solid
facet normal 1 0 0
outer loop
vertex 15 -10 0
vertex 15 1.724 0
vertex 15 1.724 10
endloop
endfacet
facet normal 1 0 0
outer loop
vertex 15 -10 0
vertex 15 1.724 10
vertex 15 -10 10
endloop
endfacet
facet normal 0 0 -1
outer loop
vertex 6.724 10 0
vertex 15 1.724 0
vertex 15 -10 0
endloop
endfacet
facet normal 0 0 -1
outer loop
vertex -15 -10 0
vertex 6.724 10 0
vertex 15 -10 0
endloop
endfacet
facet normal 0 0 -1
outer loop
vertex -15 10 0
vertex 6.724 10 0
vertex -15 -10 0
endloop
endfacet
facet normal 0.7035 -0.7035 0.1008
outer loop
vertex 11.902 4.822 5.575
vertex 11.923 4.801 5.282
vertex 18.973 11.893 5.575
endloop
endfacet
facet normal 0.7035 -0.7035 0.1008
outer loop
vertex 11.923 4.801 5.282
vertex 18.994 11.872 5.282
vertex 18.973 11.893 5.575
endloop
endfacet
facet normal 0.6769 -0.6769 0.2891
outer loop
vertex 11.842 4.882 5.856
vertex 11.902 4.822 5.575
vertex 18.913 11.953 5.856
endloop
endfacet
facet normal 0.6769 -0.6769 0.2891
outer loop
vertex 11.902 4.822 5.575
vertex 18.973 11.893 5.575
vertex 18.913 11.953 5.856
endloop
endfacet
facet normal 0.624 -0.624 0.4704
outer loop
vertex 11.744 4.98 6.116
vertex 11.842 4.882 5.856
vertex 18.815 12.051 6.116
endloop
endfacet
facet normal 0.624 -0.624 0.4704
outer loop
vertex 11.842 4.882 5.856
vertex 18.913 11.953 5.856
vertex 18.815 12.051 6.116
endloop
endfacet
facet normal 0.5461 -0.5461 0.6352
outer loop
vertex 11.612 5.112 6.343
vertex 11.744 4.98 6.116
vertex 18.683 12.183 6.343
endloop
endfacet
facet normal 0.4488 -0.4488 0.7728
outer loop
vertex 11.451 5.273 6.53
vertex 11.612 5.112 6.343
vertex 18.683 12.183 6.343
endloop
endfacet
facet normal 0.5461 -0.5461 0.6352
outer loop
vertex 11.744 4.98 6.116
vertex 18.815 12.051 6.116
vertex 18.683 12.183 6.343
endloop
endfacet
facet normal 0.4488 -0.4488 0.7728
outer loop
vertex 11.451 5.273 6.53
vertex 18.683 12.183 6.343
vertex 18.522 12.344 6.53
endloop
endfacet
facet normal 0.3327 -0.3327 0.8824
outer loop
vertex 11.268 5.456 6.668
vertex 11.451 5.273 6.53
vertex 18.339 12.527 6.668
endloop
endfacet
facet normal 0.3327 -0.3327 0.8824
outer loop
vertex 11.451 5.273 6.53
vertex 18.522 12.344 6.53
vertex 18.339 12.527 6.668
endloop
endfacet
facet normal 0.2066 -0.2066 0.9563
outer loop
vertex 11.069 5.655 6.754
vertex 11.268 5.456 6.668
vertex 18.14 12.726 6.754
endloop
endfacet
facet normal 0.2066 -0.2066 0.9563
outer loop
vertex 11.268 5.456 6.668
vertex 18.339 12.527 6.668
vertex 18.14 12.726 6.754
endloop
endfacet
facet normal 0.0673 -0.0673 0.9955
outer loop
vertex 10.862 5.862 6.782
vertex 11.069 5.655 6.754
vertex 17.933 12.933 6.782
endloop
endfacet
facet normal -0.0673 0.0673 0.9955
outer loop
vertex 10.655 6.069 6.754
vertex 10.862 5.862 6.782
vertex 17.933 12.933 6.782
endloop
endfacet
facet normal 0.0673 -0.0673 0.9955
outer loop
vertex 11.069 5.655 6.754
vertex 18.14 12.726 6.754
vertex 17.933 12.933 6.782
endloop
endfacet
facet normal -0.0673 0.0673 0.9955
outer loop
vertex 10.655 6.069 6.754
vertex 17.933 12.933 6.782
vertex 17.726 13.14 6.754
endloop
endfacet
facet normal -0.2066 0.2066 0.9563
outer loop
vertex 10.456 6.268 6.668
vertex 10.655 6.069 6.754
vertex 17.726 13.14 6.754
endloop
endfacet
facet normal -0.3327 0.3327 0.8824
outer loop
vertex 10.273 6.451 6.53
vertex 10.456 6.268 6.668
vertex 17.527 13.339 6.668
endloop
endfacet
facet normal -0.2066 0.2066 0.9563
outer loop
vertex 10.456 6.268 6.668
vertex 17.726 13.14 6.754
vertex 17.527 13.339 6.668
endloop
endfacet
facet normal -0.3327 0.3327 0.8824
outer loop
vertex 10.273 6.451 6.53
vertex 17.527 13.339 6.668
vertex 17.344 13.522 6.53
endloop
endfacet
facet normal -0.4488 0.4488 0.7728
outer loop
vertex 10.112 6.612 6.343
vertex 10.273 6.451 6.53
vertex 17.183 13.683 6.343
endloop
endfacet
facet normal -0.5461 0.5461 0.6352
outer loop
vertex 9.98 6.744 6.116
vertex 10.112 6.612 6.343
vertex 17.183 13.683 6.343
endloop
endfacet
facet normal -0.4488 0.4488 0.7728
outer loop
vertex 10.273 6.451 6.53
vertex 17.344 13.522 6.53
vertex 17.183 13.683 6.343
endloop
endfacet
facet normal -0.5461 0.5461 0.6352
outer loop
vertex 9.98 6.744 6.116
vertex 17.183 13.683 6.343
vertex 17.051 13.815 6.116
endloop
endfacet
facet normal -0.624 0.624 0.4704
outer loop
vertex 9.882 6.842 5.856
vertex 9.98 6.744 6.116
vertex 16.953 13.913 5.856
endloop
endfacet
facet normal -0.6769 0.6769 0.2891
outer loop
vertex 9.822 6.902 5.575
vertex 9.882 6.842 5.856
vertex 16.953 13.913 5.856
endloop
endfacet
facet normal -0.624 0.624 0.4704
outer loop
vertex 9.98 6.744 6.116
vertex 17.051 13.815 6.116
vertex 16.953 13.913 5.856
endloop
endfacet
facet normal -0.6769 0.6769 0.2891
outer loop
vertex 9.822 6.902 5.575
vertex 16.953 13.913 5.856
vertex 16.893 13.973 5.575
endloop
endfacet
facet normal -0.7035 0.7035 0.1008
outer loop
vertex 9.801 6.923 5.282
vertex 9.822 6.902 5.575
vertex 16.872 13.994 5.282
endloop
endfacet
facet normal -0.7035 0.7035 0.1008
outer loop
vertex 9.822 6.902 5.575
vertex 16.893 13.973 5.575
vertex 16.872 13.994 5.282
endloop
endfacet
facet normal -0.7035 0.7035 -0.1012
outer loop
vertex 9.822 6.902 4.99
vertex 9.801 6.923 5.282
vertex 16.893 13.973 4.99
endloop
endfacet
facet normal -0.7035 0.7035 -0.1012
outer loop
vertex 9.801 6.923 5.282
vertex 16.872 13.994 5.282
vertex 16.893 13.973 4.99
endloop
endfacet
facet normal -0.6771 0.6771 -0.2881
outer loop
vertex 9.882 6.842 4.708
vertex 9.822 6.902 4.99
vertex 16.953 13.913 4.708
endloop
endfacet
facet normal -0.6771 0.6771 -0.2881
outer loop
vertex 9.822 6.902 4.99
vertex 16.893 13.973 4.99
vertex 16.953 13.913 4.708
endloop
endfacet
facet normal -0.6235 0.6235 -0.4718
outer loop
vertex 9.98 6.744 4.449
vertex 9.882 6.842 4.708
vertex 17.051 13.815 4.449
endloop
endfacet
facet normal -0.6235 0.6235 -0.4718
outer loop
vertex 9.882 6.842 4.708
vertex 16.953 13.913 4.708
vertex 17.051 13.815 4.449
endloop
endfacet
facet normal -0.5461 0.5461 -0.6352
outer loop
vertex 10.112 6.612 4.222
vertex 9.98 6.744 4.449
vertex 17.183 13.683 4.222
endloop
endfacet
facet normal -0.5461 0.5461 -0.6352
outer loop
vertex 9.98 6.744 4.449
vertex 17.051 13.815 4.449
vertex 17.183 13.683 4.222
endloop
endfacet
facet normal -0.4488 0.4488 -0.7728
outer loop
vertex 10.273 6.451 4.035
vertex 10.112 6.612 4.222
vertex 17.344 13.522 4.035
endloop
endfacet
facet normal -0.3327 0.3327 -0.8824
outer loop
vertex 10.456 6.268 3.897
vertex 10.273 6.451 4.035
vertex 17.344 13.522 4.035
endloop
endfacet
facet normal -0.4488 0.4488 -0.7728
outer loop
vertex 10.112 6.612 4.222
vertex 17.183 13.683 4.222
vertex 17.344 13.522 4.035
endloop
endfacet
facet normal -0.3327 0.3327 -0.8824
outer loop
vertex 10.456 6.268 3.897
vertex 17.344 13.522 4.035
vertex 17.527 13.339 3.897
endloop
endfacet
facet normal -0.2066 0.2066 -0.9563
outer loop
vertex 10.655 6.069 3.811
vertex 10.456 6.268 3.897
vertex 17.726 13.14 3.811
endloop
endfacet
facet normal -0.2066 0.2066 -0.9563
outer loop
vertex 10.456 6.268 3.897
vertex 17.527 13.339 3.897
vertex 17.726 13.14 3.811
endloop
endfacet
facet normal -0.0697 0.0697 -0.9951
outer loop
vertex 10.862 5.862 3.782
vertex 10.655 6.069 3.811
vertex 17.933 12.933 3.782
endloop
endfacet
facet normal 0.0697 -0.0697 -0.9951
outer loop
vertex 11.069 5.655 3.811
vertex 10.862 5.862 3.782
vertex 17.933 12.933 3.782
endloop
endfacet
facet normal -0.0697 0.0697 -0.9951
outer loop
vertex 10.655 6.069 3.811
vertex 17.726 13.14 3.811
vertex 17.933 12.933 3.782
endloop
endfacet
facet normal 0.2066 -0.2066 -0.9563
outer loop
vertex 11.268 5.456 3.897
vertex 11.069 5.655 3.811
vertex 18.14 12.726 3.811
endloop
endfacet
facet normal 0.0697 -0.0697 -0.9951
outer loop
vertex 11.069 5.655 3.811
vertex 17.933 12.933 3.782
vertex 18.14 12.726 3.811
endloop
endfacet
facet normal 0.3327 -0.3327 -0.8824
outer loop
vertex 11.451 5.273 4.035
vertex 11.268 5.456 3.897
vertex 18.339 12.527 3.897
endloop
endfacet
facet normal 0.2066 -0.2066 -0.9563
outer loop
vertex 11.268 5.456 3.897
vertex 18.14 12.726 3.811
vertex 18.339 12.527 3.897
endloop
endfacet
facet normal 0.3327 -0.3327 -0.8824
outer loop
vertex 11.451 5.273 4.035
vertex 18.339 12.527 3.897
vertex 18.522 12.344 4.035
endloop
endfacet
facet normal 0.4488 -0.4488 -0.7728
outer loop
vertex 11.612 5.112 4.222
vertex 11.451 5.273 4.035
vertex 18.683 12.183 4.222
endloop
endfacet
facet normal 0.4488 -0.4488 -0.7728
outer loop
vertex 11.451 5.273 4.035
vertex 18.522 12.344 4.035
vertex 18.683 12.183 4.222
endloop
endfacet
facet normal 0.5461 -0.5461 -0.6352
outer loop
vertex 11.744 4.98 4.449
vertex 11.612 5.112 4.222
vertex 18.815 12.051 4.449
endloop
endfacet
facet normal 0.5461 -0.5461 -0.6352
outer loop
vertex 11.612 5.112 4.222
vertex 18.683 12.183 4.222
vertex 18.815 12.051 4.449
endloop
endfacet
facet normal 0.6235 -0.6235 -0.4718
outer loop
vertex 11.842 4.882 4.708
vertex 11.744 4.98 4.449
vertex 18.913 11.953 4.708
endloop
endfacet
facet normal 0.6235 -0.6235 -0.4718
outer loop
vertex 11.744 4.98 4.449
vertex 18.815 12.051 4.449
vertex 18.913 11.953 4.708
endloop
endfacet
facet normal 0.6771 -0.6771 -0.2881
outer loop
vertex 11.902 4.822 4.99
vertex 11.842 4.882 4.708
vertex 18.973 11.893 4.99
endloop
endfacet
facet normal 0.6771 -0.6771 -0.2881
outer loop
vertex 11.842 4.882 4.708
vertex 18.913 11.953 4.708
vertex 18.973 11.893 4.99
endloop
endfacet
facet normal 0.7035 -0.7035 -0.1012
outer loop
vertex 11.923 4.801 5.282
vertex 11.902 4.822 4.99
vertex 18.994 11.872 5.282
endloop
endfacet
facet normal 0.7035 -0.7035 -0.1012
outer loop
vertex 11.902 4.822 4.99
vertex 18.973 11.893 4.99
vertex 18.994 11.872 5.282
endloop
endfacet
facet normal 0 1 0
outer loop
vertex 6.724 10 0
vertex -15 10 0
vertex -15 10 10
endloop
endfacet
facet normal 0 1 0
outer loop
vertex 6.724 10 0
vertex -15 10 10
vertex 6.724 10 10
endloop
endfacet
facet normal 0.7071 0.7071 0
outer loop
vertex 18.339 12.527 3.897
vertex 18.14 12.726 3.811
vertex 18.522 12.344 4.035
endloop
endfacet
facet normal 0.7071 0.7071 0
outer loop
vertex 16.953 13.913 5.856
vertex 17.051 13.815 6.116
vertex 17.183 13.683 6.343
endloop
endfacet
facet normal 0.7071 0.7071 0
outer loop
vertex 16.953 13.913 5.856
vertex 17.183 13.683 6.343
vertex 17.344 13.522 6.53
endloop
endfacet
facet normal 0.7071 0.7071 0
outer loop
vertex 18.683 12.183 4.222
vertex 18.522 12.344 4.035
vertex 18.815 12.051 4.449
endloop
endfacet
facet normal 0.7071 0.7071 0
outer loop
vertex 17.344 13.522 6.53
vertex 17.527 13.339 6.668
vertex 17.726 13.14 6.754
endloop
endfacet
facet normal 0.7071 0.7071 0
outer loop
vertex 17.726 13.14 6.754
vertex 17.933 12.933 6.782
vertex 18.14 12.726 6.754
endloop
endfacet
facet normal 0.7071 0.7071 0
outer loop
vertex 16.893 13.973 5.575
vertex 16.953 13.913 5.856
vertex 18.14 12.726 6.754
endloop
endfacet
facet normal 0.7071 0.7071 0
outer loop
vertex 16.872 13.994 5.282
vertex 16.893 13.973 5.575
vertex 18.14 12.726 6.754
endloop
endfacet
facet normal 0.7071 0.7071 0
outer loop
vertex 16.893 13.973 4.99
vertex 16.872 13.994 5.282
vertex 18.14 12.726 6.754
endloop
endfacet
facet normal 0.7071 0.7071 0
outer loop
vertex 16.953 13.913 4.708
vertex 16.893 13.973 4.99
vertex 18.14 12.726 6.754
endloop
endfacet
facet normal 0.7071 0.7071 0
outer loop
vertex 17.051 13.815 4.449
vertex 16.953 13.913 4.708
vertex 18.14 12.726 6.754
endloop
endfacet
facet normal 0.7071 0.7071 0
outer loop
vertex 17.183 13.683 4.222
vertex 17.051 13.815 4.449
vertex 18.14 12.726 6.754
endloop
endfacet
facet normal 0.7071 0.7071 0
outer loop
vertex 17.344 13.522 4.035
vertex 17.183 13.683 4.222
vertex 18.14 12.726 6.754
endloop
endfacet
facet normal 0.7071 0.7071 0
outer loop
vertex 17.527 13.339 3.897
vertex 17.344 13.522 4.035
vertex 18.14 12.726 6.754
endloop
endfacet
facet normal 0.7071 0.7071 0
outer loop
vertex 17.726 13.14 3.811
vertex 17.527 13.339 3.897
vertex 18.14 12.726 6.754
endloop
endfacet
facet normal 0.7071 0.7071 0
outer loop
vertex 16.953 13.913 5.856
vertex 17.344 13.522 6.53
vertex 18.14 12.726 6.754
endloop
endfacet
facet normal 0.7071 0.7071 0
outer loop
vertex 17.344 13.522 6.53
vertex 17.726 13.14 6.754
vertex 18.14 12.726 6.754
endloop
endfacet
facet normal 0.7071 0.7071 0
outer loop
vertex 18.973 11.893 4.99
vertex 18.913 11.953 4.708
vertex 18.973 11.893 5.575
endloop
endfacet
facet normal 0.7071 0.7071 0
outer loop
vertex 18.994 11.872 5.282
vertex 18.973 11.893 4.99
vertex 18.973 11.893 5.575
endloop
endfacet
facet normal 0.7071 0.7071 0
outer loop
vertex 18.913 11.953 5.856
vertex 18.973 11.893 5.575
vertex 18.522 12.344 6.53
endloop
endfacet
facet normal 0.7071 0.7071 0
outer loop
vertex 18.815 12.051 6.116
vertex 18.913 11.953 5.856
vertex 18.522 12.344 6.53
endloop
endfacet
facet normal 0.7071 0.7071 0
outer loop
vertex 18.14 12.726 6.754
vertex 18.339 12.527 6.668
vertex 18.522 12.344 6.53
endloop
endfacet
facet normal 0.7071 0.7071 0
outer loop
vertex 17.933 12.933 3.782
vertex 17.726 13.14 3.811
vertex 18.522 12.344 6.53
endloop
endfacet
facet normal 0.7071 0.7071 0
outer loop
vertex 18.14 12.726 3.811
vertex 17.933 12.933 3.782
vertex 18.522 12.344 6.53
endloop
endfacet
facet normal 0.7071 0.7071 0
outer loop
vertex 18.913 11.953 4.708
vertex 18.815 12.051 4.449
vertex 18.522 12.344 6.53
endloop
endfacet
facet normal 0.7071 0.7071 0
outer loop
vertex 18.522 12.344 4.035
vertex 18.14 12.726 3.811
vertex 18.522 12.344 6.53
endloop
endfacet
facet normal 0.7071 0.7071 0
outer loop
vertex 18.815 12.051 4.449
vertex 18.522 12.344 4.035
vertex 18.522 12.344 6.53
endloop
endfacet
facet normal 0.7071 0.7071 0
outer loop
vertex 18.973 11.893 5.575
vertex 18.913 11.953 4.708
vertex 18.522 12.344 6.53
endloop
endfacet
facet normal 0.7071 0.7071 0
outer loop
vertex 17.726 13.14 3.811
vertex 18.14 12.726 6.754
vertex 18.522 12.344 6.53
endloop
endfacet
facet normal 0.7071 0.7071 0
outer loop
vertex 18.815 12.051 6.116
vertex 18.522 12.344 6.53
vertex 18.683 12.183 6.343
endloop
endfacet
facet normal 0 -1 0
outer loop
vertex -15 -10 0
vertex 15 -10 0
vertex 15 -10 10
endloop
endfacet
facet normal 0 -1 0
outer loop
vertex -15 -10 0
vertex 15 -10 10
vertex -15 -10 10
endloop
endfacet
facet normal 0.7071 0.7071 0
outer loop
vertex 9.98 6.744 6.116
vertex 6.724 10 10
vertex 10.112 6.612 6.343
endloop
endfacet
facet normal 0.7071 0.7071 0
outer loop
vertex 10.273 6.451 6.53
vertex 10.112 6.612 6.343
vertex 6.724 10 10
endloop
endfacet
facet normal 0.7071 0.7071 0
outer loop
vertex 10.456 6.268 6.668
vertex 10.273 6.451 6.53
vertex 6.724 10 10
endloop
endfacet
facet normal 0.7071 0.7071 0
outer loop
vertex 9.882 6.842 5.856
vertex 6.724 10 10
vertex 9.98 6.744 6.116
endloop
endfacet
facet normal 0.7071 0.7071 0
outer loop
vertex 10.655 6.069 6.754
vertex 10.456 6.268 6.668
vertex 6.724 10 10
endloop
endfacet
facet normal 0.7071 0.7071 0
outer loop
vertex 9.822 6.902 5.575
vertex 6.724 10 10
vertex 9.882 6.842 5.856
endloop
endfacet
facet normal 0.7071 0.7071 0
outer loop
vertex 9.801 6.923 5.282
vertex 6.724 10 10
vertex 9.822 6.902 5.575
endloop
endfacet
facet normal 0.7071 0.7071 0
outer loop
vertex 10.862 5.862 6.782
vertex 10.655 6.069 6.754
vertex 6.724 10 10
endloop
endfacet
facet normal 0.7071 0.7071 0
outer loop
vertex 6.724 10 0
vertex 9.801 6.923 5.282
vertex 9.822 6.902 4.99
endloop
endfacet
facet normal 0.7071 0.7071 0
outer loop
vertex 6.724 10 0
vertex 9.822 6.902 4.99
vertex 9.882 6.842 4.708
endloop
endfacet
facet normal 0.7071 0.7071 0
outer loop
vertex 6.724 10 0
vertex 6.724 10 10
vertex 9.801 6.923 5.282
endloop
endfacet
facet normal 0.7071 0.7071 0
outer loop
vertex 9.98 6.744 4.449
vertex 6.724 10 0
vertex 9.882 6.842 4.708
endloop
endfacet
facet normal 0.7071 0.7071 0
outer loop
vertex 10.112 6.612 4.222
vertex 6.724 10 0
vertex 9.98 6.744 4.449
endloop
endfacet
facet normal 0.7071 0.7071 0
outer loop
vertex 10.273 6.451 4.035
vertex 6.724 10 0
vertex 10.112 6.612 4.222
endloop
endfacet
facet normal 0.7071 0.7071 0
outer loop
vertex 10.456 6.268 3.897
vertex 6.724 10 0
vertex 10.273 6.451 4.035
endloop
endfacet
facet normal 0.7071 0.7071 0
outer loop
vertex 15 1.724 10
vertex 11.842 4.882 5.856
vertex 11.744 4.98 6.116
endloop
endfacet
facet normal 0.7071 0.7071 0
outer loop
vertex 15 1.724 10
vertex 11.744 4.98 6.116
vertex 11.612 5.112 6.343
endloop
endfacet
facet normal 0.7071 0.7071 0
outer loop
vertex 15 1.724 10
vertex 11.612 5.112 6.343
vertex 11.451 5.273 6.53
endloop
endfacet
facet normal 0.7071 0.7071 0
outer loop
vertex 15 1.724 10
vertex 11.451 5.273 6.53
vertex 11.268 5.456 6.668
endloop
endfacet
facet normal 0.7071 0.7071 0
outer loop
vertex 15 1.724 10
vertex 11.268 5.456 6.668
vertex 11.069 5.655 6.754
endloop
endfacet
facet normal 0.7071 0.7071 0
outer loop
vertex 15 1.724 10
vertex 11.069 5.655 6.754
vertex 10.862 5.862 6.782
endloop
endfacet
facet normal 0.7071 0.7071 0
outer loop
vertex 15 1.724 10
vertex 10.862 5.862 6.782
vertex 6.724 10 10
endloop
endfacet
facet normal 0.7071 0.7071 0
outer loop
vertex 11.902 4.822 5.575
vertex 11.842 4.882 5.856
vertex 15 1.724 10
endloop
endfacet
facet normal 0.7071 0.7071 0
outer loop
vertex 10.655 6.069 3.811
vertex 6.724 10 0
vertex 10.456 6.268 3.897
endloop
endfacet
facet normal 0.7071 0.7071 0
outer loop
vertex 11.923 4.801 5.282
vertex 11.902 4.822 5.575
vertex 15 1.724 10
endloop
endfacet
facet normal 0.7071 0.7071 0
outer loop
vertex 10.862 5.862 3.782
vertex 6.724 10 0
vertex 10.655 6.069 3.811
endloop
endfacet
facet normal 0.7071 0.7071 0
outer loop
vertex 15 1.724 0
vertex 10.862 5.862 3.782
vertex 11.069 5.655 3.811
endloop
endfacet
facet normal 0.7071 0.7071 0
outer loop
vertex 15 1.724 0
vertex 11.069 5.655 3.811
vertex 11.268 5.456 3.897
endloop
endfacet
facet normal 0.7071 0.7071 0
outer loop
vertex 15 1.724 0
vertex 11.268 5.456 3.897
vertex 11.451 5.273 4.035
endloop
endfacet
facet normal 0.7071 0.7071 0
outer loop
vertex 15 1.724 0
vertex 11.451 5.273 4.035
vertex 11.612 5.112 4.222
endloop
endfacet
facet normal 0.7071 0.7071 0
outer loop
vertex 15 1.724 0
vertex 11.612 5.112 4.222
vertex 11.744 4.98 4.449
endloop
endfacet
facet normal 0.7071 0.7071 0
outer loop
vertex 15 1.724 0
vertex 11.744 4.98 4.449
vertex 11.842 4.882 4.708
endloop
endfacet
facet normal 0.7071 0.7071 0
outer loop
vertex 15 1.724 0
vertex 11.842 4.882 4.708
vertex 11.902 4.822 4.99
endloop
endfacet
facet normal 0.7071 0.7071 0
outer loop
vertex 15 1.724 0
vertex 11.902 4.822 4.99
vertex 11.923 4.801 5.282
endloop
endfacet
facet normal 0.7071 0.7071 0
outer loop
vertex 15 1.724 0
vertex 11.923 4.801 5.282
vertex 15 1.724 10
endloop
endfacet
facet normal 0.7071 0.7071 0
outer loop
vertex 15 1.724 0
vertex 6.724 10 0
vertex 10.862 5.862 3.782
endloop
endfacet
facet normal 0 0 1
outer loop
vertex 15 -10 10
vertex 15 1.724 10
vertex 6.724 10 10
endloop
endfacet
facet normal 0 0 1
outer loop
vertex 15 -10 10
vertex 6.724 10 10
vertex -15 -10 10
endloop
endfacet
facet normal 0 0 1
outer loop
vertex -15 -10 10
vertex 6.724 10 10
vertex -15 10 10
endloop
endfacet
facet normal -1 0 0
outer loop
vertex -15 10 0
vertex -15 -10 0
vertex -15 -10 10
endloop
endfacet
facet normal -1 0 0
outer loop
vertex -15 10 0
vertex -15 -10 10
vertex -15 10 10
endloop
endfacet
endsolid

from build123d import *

# Parameters (mm, degrees)
BOSS_EXTRUDE1_DEPTH = 10


with BuildPart() as part:
    # Sketch1 → Boss-Extrude1 (new body)
    with BuildSketch(Plane(origin=(0, 0, 0), x_dir=(-1, 0, 0), z_dir=(0, 0, -1))):
        Polygon((-15, 1.724031376), (-15, -10), (15, -10), (15, 10), (-6.724031376, 10), align=None)
    extrude(amount=-BOSS_EXTRUDE1_DEPTH)

    # Sketch2 → Revolve1 (revolve)
    with BuildSketch(Plane.XY.offset(5.2823368)):
        Polygon((18.993743672, 11.872423328), (17.9330835, 12.9330835), (10.862015688, 5.862015688), (11.92267586, 4.801355516), align=None)
    revolve(axis=Axis((18.463413586, 13.463413586, 5.2823368), (-0.7071067811865389, -0.7071067811865562, 0)))


solid = part.part
